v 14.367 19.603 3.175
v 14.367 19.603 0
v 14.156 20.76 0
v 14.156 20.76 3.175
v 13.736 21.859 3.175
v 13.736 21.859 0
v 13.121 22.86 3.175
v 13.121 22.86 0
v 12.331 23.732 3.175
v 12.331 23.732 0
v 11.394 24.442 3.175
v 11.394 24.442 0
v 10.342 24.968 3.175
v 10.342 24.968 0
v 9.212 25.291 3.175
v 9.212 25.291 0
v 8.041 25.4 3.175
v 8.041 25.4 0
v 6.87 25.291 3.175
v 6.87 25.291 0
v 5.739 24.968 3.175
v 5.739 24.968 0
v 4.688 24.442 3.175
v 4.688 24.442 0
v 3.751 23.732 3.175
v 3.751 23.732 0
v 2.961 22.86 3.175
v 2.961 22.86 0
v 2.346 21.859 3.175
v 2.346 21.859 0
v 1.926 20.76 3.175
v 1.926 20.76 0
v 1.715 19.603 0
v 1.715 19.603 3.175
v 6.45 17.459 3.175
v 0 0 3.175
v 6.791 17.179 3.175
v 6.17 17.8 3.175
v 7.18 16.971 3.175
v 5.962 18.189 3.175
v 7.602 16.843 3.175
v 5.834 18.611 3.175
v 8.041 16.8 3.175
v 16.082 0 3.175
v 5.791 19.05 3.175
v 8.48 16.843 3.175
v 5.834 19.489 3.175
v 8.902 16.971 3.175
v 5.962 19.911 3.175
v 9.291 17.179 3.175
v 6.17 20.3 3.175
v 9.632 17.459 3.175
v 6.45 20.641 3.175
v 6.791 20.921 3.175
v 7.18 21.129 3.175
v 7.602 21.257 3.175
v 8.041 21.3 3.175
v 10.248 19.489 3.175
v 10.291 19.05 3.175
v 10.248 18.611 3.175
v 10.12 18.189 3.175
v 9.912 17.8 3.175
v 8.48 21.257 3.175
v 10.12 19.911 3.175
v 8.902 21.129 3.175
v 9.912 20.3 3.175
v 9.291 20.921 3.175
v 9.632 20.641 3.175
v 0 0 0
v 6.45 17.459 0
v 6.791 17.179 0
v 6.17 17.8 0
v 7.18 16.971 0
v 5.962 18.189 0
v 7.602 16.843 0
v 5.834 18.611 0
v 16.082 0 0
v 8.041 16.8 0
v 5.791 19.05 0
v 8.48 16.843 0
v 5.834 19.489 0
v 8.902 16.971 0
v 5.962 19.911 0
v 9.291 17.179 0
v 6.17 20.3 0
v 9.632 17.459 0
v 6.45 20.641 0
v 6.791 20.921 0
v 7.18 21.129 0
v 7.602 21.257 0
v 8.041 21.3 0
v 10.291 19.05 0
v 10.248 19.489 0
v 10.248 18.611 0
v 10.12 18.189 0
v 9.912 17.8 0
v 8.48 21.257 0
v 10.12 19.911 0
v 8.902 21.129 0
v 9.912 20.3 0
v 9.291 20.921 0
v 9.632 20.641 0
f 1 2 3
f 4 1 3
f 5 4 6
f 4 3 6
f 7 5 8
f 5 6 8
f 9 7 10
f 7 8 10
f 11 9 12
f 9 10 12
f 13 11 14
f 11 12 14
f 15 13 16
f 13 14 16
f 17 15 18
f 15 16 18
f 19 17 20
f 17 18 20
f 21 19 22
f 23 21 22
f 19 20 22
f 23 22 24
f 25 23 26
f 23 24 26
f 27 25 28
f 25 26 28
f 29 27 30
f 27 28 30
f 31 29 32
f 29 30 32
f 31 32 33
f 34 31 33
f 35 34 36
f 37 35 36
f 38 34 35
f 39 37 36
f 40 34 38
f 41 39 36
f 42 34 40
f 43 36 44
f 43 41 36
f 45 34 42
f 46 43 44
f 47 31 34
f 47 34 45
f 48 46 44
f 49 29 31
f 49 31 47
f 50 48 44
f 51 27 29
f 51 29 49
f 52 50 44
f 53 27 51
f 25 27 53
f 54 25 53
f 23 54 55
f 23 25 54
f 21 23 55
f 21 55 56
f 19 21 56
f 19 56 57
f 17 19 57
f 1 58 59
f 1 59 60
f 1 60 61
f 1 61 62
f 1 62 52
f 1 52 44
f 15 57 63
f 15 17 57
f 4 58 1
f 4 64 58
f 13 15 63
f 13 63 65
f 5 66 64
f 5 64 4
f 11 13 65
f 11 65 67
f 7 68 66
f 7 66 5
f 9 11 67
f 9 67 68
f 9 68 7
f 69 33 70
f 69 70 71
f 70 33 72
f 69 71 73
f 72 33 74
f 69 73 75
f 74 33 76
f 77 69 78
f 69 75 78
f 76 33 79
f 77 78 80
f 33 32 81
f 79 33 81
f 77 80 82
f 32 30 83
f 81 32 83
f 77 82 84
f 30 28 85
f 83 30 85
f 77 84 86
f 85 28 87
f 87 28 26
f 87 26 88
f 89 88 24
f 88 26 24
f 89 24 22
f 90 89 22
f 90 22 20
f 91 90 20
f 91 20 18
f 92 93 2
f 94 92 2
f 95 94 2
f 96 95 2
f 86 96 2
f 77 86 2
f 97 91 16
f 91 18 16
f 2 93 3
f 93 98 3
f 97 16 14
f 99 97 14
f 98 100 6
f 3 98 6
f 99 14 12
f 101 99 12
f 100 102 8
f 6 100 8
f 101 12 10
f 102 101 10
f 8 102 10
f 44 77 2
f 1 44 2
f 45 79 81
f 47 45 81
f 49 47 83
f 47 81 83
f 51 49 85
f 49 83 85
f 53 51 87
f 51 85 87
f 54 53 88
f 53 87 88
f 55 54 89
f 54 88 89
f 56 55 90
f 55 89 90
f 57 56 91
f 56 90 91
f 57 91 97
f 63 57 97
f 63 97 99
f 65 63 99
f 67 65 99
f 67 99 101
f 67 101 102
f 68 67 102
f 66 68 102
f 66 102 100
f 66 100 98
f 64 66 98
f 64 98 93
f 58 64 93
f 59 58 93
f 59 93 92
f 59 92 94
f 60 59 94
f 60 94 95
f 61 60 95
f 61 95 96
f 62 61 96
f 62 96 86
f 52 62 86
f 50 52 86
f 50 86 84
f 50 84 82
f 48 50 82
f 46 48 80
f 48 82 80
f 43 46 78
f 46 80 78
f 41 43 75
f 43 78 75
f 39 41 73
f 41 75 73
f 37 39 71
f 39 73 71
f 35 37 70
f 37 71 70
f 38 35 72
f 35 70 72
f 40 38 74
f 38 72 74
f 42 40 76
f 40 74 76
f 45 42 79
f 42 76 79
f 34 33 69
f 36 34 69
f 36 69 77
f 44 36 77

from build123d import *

# Parameters (mm, degrees)
BOSS_EXTRUDE1_DEPTH      = 3.175
M4_CLEARANCE_HOLE1_D     = 4.5
M4_CLEARANCE_HOLE1_DEPTH = 16.002
M4_CLEARANCE_HOLE1_TIP   = 1.351936393


with BuildPart() as part:
    # Sketch1 → Boss-Extrude1 (new body)
    with BuildSketch(Plane.XY):
        with BuildLine():
            Line((0, 0), (16.081830017, 0))
            Line((16.081830017, 0), (14.366751341, 19.603438966))
            ThreePointArc((14.366751341, 19.603438966), (8.040915009, 25.4), (1.715078676, 19.603438966))
            Line((1.715078676, 19.603438966), (0, 0))
        make_face()
    extrude(amount=BOSS_EXTRUDE1_DEPTH)

    # M4 Clearance Hole1
    with Locations(Plane.XY.offset(3.175)):
        with Locations((8.040915009, 19.05)):
            Hole(M4_CLEARANCE_HOLE1_D / 2, depth=M4_CLEARANCE_HOLE1_DEPTH)
            with Locations((0, 0, -(M4_CLEARANCE_HOLE1_DEPTH + M4_CLEARANCE_HOLE1_TIP / 2))):  # 118° drill point
                Cone(0, M4_CLEARANCE_HOLE1_D / 2, M4_CLEARANCE_HOLE1_TIP, mode=Mode.SUBTRACT)


solid = part.part
